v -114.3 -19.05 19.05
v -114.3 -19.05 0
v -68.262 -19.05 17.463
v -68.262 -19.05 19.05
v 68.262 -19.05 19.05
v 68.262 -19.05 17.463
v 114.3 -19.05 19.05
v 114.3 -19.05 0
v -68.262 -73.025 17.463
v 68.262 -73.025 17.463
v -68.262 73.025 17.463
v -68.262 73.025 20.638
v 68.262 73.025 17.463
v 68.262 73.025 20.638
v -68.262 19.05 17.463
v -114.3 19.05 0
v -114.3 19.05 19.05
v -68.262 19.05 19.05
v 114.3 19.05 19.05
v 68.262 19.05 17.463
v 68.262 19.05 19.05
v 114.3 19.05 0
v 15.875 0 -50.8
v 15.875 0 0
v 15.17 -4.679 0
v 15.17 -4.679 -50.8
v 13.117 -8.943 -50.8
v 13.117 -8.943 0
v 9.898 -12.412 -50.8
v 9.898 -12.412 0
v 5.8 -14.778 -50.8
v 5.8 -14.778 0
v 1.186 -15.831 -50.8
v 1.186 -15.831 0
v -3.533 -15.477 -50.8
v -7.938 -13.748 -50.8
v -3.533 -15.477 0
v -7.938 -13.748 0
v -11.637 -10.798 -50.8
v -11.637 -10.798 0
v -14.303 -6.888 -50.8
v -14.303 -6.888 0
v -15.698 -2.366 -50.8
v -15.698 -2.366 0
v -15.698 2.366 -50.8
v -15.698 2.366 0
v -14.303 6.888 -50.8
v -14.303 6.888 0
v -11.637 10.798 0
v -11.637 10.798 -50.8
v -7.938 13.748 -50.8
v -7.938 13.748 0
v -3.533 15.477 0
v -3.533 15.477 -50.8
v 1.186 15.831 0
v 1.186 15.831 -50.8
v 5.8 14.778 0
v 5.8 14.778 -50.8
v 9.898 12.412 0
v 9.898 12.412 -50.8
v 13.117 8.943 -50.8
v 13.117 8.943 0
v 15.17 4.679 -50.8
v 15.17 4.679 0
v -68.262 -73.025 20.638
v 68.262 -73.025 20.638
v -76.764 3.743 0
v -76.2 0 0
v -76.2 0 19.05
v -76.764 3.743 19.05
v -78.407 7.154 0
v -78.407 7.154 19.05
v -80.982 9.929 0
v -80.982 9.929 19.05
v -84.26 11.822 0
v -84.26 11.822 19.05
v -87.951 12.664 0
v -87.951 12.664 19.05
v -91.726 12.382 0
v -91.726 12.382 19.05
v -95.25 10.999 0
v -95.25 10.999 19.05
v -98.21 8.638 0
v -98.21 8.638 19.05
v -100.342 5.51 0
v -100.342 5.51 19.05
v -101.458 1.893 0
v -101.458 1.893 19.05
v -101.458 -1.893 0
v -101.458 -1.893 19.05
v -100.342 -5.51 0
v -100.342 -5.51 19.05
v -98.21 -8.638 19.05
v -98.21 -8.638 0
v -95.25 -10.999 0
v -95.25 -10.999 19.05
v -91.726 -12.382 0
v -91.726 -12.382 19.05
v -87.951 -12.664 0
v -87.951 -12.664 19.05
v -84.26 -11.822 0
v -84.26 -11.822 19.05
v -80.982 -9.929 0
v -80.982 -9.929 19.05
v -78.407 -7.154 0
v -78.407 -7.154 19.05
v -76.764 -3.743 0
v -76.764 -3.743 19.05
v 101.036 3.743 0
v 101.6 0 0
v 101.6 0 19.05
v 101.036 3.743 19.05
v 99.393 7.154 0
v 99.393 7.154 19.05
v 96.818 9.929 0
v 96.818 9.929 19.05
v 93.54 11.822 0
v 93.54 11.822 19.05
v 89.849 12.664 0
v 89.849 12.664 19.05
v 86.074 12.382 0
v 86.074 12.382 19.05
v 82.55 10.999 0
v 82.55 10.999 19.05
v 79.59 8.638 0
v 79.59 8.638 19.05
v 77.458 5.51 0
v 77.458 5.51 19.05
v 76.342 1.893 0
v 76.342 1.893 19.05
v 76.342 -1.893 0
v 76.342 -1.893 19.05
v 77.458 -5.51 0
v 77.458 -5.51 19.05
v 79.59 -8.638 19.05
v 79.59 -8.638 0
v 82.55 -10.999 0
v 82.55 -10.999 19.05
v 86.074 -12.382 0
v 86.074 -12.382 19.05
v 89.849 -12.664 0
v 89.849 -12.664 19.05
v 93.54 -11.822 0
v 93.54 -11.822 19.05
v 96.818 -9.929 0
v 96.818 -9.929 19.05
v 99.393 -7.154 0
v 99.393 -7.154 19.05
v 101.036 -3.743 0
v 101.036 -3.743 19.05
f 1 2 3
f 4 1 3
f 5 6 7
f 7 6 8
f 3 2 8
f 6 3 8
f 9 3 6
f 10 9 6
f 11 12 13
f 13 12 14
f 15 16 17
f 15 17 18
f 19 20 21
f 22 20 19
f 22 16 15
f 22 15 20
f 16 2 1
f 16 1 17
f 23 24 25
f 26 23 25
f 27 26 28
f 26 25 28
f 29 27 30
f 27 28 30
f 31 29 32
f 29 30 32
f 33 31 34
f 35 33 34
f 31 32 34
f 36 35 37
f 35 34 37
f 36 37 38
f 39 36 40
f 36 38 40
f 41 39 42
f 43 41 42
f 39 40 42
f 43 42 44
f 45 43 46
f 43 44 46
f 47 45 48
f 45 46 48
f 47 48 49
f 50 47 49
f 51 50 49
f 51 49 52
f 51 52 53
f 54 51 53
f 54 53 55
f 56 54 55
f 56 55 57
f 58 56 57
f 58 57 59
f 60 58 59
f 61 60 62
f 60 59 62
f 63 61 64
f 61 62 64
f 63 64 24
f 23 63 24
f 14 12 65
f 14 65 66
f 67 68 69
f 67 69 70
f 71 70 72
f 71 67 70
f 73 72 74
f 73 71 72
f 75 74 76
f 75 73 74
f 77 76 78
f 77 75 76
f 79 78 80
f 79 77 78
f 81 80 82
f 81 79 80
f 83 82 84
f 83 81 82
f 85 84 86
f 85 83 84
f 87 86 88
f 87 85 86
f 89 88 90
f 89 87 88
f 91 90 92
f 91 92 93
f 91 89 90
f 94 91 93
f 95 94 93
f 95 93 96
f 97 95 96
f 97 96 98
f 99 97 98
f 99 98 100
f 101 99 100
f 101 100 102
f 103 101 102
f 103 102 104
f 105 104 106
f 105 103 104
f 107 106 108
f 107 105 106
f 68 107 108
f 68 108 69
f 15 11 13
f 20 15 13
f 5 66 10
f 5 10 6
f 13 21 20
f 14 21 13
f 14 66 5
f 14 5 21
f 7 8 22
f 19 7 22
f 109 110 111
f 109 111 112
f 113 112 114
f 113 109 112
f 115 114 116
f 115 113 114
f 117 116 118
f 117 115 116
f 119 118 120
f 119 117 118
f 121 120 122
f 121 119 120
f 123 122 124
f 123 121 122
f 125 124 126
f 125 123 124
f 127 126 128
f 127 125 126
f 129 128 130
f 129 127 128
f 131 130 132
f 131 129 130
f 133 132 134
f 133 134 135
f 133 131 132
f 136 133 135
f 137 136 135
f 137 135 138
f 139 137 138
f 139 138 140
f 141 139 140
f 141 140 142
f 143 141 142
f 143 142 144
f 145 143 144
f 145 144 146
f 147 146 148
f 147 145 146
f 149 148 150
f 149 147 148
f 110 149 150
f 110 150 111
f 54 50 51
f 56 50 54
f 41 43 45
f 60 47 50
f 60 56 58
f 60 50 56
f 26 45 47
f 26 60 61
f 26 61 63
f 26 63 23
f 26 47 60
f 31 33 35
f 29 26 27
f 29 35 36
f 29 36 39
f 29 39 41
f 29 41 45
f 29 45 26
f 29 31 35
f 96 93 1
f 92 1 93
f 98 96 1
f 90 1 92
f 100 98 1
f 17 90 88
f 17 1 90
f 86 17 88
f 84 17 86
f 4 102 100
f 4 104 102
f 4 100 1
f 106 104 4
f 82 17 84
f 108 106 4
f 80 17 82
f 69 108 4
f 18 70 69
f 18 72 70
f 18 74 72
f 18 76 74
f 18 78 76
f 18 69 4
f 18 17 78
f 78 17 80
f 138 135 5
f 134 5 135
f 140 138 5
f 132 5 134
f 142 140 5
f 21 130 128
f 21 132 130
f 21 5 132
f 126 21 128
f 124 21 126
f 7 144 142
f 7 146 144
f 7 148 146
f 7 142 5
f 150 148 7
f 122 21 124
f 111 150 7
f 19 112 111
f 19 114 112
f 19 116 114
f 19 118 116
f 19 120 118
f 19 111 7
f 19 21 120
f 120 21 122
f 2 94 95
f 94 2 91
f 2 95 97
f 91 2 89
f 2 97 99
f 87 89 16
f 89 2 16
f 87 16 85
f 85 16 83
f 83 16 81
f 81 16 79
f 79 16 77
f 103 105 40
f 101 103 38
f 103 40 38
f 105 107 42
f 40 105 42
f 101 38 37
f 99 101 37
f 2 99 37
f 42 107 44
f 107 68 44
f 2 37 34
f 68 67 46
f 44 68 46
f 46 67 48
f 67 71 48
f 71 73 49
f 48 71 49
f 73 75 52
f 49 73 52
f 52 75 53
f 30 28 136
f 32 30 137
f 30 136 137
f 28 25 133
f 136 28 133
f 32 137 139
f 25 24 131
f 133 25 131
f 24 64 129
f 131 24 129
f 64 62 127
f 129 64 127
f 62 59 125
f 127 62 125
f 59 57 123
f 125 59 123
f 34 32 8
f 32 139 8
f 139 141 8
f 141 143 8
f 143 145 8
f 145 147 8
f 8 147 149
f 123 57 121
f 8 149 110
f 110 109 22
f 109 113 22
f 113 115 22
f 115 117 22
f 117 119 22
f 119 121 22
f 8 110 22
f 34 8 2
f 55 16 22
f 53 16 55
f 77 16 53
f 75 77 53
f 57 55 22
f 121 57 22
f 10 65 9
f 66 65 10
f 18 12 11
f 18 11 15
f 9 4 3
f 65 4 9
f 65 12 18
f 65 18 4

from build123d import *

# Parameters (mm, degrees)
F0_W     = 228.6
F0_H     = 38.1
F0_R     = 12.7
F1_DEPTH = 19.05
F2_W     = 136.525
F2_H     = 38.1
F2_H_2   = 53.975
F3_DEPTH = 1.5875
F4_R     = 15.875
F5_DEPTH = 50.8


with BuildPart() as f1:
    # F0 (on Top) → F1 (new body)
    with BuildSketch(Plane.XY):
        Rectangle(F0_W, F0_H)
        with Locations((-88.9, 0)):
            Circle(F0_R, mode=Mode.SUBTRACT)
        with Locations((88.9, 0)):
            Circle(F0_R, mode=Mode.SUBTRACT)
    extrude(amount=F1_DEPTH)

    # F2 (on face) → F3 (join, symmetric)
    with BuildSketch(Plane.XY.offset(19.05)):
        Rectangle(F2_W, F2_H)
        with Locations((0, 46.0375)):
            Rectangle(F2_W, F2_H_2)
        with Locations((0, -46.0375)):
            Rectangle(F2_W, F2_H_2)
    extrude(amount=F3_DEPTH, both=True)

    # F4 (on face) → F5 (join)
    with BuildSketch(Plane(origin=(0, 0, 0), x_dir=(1, 0, 0), z_dir=(0, 0, -1))):
        Circle(F4_R)
    extrude(amount=F5_DEPTH)


solid = f1.part
